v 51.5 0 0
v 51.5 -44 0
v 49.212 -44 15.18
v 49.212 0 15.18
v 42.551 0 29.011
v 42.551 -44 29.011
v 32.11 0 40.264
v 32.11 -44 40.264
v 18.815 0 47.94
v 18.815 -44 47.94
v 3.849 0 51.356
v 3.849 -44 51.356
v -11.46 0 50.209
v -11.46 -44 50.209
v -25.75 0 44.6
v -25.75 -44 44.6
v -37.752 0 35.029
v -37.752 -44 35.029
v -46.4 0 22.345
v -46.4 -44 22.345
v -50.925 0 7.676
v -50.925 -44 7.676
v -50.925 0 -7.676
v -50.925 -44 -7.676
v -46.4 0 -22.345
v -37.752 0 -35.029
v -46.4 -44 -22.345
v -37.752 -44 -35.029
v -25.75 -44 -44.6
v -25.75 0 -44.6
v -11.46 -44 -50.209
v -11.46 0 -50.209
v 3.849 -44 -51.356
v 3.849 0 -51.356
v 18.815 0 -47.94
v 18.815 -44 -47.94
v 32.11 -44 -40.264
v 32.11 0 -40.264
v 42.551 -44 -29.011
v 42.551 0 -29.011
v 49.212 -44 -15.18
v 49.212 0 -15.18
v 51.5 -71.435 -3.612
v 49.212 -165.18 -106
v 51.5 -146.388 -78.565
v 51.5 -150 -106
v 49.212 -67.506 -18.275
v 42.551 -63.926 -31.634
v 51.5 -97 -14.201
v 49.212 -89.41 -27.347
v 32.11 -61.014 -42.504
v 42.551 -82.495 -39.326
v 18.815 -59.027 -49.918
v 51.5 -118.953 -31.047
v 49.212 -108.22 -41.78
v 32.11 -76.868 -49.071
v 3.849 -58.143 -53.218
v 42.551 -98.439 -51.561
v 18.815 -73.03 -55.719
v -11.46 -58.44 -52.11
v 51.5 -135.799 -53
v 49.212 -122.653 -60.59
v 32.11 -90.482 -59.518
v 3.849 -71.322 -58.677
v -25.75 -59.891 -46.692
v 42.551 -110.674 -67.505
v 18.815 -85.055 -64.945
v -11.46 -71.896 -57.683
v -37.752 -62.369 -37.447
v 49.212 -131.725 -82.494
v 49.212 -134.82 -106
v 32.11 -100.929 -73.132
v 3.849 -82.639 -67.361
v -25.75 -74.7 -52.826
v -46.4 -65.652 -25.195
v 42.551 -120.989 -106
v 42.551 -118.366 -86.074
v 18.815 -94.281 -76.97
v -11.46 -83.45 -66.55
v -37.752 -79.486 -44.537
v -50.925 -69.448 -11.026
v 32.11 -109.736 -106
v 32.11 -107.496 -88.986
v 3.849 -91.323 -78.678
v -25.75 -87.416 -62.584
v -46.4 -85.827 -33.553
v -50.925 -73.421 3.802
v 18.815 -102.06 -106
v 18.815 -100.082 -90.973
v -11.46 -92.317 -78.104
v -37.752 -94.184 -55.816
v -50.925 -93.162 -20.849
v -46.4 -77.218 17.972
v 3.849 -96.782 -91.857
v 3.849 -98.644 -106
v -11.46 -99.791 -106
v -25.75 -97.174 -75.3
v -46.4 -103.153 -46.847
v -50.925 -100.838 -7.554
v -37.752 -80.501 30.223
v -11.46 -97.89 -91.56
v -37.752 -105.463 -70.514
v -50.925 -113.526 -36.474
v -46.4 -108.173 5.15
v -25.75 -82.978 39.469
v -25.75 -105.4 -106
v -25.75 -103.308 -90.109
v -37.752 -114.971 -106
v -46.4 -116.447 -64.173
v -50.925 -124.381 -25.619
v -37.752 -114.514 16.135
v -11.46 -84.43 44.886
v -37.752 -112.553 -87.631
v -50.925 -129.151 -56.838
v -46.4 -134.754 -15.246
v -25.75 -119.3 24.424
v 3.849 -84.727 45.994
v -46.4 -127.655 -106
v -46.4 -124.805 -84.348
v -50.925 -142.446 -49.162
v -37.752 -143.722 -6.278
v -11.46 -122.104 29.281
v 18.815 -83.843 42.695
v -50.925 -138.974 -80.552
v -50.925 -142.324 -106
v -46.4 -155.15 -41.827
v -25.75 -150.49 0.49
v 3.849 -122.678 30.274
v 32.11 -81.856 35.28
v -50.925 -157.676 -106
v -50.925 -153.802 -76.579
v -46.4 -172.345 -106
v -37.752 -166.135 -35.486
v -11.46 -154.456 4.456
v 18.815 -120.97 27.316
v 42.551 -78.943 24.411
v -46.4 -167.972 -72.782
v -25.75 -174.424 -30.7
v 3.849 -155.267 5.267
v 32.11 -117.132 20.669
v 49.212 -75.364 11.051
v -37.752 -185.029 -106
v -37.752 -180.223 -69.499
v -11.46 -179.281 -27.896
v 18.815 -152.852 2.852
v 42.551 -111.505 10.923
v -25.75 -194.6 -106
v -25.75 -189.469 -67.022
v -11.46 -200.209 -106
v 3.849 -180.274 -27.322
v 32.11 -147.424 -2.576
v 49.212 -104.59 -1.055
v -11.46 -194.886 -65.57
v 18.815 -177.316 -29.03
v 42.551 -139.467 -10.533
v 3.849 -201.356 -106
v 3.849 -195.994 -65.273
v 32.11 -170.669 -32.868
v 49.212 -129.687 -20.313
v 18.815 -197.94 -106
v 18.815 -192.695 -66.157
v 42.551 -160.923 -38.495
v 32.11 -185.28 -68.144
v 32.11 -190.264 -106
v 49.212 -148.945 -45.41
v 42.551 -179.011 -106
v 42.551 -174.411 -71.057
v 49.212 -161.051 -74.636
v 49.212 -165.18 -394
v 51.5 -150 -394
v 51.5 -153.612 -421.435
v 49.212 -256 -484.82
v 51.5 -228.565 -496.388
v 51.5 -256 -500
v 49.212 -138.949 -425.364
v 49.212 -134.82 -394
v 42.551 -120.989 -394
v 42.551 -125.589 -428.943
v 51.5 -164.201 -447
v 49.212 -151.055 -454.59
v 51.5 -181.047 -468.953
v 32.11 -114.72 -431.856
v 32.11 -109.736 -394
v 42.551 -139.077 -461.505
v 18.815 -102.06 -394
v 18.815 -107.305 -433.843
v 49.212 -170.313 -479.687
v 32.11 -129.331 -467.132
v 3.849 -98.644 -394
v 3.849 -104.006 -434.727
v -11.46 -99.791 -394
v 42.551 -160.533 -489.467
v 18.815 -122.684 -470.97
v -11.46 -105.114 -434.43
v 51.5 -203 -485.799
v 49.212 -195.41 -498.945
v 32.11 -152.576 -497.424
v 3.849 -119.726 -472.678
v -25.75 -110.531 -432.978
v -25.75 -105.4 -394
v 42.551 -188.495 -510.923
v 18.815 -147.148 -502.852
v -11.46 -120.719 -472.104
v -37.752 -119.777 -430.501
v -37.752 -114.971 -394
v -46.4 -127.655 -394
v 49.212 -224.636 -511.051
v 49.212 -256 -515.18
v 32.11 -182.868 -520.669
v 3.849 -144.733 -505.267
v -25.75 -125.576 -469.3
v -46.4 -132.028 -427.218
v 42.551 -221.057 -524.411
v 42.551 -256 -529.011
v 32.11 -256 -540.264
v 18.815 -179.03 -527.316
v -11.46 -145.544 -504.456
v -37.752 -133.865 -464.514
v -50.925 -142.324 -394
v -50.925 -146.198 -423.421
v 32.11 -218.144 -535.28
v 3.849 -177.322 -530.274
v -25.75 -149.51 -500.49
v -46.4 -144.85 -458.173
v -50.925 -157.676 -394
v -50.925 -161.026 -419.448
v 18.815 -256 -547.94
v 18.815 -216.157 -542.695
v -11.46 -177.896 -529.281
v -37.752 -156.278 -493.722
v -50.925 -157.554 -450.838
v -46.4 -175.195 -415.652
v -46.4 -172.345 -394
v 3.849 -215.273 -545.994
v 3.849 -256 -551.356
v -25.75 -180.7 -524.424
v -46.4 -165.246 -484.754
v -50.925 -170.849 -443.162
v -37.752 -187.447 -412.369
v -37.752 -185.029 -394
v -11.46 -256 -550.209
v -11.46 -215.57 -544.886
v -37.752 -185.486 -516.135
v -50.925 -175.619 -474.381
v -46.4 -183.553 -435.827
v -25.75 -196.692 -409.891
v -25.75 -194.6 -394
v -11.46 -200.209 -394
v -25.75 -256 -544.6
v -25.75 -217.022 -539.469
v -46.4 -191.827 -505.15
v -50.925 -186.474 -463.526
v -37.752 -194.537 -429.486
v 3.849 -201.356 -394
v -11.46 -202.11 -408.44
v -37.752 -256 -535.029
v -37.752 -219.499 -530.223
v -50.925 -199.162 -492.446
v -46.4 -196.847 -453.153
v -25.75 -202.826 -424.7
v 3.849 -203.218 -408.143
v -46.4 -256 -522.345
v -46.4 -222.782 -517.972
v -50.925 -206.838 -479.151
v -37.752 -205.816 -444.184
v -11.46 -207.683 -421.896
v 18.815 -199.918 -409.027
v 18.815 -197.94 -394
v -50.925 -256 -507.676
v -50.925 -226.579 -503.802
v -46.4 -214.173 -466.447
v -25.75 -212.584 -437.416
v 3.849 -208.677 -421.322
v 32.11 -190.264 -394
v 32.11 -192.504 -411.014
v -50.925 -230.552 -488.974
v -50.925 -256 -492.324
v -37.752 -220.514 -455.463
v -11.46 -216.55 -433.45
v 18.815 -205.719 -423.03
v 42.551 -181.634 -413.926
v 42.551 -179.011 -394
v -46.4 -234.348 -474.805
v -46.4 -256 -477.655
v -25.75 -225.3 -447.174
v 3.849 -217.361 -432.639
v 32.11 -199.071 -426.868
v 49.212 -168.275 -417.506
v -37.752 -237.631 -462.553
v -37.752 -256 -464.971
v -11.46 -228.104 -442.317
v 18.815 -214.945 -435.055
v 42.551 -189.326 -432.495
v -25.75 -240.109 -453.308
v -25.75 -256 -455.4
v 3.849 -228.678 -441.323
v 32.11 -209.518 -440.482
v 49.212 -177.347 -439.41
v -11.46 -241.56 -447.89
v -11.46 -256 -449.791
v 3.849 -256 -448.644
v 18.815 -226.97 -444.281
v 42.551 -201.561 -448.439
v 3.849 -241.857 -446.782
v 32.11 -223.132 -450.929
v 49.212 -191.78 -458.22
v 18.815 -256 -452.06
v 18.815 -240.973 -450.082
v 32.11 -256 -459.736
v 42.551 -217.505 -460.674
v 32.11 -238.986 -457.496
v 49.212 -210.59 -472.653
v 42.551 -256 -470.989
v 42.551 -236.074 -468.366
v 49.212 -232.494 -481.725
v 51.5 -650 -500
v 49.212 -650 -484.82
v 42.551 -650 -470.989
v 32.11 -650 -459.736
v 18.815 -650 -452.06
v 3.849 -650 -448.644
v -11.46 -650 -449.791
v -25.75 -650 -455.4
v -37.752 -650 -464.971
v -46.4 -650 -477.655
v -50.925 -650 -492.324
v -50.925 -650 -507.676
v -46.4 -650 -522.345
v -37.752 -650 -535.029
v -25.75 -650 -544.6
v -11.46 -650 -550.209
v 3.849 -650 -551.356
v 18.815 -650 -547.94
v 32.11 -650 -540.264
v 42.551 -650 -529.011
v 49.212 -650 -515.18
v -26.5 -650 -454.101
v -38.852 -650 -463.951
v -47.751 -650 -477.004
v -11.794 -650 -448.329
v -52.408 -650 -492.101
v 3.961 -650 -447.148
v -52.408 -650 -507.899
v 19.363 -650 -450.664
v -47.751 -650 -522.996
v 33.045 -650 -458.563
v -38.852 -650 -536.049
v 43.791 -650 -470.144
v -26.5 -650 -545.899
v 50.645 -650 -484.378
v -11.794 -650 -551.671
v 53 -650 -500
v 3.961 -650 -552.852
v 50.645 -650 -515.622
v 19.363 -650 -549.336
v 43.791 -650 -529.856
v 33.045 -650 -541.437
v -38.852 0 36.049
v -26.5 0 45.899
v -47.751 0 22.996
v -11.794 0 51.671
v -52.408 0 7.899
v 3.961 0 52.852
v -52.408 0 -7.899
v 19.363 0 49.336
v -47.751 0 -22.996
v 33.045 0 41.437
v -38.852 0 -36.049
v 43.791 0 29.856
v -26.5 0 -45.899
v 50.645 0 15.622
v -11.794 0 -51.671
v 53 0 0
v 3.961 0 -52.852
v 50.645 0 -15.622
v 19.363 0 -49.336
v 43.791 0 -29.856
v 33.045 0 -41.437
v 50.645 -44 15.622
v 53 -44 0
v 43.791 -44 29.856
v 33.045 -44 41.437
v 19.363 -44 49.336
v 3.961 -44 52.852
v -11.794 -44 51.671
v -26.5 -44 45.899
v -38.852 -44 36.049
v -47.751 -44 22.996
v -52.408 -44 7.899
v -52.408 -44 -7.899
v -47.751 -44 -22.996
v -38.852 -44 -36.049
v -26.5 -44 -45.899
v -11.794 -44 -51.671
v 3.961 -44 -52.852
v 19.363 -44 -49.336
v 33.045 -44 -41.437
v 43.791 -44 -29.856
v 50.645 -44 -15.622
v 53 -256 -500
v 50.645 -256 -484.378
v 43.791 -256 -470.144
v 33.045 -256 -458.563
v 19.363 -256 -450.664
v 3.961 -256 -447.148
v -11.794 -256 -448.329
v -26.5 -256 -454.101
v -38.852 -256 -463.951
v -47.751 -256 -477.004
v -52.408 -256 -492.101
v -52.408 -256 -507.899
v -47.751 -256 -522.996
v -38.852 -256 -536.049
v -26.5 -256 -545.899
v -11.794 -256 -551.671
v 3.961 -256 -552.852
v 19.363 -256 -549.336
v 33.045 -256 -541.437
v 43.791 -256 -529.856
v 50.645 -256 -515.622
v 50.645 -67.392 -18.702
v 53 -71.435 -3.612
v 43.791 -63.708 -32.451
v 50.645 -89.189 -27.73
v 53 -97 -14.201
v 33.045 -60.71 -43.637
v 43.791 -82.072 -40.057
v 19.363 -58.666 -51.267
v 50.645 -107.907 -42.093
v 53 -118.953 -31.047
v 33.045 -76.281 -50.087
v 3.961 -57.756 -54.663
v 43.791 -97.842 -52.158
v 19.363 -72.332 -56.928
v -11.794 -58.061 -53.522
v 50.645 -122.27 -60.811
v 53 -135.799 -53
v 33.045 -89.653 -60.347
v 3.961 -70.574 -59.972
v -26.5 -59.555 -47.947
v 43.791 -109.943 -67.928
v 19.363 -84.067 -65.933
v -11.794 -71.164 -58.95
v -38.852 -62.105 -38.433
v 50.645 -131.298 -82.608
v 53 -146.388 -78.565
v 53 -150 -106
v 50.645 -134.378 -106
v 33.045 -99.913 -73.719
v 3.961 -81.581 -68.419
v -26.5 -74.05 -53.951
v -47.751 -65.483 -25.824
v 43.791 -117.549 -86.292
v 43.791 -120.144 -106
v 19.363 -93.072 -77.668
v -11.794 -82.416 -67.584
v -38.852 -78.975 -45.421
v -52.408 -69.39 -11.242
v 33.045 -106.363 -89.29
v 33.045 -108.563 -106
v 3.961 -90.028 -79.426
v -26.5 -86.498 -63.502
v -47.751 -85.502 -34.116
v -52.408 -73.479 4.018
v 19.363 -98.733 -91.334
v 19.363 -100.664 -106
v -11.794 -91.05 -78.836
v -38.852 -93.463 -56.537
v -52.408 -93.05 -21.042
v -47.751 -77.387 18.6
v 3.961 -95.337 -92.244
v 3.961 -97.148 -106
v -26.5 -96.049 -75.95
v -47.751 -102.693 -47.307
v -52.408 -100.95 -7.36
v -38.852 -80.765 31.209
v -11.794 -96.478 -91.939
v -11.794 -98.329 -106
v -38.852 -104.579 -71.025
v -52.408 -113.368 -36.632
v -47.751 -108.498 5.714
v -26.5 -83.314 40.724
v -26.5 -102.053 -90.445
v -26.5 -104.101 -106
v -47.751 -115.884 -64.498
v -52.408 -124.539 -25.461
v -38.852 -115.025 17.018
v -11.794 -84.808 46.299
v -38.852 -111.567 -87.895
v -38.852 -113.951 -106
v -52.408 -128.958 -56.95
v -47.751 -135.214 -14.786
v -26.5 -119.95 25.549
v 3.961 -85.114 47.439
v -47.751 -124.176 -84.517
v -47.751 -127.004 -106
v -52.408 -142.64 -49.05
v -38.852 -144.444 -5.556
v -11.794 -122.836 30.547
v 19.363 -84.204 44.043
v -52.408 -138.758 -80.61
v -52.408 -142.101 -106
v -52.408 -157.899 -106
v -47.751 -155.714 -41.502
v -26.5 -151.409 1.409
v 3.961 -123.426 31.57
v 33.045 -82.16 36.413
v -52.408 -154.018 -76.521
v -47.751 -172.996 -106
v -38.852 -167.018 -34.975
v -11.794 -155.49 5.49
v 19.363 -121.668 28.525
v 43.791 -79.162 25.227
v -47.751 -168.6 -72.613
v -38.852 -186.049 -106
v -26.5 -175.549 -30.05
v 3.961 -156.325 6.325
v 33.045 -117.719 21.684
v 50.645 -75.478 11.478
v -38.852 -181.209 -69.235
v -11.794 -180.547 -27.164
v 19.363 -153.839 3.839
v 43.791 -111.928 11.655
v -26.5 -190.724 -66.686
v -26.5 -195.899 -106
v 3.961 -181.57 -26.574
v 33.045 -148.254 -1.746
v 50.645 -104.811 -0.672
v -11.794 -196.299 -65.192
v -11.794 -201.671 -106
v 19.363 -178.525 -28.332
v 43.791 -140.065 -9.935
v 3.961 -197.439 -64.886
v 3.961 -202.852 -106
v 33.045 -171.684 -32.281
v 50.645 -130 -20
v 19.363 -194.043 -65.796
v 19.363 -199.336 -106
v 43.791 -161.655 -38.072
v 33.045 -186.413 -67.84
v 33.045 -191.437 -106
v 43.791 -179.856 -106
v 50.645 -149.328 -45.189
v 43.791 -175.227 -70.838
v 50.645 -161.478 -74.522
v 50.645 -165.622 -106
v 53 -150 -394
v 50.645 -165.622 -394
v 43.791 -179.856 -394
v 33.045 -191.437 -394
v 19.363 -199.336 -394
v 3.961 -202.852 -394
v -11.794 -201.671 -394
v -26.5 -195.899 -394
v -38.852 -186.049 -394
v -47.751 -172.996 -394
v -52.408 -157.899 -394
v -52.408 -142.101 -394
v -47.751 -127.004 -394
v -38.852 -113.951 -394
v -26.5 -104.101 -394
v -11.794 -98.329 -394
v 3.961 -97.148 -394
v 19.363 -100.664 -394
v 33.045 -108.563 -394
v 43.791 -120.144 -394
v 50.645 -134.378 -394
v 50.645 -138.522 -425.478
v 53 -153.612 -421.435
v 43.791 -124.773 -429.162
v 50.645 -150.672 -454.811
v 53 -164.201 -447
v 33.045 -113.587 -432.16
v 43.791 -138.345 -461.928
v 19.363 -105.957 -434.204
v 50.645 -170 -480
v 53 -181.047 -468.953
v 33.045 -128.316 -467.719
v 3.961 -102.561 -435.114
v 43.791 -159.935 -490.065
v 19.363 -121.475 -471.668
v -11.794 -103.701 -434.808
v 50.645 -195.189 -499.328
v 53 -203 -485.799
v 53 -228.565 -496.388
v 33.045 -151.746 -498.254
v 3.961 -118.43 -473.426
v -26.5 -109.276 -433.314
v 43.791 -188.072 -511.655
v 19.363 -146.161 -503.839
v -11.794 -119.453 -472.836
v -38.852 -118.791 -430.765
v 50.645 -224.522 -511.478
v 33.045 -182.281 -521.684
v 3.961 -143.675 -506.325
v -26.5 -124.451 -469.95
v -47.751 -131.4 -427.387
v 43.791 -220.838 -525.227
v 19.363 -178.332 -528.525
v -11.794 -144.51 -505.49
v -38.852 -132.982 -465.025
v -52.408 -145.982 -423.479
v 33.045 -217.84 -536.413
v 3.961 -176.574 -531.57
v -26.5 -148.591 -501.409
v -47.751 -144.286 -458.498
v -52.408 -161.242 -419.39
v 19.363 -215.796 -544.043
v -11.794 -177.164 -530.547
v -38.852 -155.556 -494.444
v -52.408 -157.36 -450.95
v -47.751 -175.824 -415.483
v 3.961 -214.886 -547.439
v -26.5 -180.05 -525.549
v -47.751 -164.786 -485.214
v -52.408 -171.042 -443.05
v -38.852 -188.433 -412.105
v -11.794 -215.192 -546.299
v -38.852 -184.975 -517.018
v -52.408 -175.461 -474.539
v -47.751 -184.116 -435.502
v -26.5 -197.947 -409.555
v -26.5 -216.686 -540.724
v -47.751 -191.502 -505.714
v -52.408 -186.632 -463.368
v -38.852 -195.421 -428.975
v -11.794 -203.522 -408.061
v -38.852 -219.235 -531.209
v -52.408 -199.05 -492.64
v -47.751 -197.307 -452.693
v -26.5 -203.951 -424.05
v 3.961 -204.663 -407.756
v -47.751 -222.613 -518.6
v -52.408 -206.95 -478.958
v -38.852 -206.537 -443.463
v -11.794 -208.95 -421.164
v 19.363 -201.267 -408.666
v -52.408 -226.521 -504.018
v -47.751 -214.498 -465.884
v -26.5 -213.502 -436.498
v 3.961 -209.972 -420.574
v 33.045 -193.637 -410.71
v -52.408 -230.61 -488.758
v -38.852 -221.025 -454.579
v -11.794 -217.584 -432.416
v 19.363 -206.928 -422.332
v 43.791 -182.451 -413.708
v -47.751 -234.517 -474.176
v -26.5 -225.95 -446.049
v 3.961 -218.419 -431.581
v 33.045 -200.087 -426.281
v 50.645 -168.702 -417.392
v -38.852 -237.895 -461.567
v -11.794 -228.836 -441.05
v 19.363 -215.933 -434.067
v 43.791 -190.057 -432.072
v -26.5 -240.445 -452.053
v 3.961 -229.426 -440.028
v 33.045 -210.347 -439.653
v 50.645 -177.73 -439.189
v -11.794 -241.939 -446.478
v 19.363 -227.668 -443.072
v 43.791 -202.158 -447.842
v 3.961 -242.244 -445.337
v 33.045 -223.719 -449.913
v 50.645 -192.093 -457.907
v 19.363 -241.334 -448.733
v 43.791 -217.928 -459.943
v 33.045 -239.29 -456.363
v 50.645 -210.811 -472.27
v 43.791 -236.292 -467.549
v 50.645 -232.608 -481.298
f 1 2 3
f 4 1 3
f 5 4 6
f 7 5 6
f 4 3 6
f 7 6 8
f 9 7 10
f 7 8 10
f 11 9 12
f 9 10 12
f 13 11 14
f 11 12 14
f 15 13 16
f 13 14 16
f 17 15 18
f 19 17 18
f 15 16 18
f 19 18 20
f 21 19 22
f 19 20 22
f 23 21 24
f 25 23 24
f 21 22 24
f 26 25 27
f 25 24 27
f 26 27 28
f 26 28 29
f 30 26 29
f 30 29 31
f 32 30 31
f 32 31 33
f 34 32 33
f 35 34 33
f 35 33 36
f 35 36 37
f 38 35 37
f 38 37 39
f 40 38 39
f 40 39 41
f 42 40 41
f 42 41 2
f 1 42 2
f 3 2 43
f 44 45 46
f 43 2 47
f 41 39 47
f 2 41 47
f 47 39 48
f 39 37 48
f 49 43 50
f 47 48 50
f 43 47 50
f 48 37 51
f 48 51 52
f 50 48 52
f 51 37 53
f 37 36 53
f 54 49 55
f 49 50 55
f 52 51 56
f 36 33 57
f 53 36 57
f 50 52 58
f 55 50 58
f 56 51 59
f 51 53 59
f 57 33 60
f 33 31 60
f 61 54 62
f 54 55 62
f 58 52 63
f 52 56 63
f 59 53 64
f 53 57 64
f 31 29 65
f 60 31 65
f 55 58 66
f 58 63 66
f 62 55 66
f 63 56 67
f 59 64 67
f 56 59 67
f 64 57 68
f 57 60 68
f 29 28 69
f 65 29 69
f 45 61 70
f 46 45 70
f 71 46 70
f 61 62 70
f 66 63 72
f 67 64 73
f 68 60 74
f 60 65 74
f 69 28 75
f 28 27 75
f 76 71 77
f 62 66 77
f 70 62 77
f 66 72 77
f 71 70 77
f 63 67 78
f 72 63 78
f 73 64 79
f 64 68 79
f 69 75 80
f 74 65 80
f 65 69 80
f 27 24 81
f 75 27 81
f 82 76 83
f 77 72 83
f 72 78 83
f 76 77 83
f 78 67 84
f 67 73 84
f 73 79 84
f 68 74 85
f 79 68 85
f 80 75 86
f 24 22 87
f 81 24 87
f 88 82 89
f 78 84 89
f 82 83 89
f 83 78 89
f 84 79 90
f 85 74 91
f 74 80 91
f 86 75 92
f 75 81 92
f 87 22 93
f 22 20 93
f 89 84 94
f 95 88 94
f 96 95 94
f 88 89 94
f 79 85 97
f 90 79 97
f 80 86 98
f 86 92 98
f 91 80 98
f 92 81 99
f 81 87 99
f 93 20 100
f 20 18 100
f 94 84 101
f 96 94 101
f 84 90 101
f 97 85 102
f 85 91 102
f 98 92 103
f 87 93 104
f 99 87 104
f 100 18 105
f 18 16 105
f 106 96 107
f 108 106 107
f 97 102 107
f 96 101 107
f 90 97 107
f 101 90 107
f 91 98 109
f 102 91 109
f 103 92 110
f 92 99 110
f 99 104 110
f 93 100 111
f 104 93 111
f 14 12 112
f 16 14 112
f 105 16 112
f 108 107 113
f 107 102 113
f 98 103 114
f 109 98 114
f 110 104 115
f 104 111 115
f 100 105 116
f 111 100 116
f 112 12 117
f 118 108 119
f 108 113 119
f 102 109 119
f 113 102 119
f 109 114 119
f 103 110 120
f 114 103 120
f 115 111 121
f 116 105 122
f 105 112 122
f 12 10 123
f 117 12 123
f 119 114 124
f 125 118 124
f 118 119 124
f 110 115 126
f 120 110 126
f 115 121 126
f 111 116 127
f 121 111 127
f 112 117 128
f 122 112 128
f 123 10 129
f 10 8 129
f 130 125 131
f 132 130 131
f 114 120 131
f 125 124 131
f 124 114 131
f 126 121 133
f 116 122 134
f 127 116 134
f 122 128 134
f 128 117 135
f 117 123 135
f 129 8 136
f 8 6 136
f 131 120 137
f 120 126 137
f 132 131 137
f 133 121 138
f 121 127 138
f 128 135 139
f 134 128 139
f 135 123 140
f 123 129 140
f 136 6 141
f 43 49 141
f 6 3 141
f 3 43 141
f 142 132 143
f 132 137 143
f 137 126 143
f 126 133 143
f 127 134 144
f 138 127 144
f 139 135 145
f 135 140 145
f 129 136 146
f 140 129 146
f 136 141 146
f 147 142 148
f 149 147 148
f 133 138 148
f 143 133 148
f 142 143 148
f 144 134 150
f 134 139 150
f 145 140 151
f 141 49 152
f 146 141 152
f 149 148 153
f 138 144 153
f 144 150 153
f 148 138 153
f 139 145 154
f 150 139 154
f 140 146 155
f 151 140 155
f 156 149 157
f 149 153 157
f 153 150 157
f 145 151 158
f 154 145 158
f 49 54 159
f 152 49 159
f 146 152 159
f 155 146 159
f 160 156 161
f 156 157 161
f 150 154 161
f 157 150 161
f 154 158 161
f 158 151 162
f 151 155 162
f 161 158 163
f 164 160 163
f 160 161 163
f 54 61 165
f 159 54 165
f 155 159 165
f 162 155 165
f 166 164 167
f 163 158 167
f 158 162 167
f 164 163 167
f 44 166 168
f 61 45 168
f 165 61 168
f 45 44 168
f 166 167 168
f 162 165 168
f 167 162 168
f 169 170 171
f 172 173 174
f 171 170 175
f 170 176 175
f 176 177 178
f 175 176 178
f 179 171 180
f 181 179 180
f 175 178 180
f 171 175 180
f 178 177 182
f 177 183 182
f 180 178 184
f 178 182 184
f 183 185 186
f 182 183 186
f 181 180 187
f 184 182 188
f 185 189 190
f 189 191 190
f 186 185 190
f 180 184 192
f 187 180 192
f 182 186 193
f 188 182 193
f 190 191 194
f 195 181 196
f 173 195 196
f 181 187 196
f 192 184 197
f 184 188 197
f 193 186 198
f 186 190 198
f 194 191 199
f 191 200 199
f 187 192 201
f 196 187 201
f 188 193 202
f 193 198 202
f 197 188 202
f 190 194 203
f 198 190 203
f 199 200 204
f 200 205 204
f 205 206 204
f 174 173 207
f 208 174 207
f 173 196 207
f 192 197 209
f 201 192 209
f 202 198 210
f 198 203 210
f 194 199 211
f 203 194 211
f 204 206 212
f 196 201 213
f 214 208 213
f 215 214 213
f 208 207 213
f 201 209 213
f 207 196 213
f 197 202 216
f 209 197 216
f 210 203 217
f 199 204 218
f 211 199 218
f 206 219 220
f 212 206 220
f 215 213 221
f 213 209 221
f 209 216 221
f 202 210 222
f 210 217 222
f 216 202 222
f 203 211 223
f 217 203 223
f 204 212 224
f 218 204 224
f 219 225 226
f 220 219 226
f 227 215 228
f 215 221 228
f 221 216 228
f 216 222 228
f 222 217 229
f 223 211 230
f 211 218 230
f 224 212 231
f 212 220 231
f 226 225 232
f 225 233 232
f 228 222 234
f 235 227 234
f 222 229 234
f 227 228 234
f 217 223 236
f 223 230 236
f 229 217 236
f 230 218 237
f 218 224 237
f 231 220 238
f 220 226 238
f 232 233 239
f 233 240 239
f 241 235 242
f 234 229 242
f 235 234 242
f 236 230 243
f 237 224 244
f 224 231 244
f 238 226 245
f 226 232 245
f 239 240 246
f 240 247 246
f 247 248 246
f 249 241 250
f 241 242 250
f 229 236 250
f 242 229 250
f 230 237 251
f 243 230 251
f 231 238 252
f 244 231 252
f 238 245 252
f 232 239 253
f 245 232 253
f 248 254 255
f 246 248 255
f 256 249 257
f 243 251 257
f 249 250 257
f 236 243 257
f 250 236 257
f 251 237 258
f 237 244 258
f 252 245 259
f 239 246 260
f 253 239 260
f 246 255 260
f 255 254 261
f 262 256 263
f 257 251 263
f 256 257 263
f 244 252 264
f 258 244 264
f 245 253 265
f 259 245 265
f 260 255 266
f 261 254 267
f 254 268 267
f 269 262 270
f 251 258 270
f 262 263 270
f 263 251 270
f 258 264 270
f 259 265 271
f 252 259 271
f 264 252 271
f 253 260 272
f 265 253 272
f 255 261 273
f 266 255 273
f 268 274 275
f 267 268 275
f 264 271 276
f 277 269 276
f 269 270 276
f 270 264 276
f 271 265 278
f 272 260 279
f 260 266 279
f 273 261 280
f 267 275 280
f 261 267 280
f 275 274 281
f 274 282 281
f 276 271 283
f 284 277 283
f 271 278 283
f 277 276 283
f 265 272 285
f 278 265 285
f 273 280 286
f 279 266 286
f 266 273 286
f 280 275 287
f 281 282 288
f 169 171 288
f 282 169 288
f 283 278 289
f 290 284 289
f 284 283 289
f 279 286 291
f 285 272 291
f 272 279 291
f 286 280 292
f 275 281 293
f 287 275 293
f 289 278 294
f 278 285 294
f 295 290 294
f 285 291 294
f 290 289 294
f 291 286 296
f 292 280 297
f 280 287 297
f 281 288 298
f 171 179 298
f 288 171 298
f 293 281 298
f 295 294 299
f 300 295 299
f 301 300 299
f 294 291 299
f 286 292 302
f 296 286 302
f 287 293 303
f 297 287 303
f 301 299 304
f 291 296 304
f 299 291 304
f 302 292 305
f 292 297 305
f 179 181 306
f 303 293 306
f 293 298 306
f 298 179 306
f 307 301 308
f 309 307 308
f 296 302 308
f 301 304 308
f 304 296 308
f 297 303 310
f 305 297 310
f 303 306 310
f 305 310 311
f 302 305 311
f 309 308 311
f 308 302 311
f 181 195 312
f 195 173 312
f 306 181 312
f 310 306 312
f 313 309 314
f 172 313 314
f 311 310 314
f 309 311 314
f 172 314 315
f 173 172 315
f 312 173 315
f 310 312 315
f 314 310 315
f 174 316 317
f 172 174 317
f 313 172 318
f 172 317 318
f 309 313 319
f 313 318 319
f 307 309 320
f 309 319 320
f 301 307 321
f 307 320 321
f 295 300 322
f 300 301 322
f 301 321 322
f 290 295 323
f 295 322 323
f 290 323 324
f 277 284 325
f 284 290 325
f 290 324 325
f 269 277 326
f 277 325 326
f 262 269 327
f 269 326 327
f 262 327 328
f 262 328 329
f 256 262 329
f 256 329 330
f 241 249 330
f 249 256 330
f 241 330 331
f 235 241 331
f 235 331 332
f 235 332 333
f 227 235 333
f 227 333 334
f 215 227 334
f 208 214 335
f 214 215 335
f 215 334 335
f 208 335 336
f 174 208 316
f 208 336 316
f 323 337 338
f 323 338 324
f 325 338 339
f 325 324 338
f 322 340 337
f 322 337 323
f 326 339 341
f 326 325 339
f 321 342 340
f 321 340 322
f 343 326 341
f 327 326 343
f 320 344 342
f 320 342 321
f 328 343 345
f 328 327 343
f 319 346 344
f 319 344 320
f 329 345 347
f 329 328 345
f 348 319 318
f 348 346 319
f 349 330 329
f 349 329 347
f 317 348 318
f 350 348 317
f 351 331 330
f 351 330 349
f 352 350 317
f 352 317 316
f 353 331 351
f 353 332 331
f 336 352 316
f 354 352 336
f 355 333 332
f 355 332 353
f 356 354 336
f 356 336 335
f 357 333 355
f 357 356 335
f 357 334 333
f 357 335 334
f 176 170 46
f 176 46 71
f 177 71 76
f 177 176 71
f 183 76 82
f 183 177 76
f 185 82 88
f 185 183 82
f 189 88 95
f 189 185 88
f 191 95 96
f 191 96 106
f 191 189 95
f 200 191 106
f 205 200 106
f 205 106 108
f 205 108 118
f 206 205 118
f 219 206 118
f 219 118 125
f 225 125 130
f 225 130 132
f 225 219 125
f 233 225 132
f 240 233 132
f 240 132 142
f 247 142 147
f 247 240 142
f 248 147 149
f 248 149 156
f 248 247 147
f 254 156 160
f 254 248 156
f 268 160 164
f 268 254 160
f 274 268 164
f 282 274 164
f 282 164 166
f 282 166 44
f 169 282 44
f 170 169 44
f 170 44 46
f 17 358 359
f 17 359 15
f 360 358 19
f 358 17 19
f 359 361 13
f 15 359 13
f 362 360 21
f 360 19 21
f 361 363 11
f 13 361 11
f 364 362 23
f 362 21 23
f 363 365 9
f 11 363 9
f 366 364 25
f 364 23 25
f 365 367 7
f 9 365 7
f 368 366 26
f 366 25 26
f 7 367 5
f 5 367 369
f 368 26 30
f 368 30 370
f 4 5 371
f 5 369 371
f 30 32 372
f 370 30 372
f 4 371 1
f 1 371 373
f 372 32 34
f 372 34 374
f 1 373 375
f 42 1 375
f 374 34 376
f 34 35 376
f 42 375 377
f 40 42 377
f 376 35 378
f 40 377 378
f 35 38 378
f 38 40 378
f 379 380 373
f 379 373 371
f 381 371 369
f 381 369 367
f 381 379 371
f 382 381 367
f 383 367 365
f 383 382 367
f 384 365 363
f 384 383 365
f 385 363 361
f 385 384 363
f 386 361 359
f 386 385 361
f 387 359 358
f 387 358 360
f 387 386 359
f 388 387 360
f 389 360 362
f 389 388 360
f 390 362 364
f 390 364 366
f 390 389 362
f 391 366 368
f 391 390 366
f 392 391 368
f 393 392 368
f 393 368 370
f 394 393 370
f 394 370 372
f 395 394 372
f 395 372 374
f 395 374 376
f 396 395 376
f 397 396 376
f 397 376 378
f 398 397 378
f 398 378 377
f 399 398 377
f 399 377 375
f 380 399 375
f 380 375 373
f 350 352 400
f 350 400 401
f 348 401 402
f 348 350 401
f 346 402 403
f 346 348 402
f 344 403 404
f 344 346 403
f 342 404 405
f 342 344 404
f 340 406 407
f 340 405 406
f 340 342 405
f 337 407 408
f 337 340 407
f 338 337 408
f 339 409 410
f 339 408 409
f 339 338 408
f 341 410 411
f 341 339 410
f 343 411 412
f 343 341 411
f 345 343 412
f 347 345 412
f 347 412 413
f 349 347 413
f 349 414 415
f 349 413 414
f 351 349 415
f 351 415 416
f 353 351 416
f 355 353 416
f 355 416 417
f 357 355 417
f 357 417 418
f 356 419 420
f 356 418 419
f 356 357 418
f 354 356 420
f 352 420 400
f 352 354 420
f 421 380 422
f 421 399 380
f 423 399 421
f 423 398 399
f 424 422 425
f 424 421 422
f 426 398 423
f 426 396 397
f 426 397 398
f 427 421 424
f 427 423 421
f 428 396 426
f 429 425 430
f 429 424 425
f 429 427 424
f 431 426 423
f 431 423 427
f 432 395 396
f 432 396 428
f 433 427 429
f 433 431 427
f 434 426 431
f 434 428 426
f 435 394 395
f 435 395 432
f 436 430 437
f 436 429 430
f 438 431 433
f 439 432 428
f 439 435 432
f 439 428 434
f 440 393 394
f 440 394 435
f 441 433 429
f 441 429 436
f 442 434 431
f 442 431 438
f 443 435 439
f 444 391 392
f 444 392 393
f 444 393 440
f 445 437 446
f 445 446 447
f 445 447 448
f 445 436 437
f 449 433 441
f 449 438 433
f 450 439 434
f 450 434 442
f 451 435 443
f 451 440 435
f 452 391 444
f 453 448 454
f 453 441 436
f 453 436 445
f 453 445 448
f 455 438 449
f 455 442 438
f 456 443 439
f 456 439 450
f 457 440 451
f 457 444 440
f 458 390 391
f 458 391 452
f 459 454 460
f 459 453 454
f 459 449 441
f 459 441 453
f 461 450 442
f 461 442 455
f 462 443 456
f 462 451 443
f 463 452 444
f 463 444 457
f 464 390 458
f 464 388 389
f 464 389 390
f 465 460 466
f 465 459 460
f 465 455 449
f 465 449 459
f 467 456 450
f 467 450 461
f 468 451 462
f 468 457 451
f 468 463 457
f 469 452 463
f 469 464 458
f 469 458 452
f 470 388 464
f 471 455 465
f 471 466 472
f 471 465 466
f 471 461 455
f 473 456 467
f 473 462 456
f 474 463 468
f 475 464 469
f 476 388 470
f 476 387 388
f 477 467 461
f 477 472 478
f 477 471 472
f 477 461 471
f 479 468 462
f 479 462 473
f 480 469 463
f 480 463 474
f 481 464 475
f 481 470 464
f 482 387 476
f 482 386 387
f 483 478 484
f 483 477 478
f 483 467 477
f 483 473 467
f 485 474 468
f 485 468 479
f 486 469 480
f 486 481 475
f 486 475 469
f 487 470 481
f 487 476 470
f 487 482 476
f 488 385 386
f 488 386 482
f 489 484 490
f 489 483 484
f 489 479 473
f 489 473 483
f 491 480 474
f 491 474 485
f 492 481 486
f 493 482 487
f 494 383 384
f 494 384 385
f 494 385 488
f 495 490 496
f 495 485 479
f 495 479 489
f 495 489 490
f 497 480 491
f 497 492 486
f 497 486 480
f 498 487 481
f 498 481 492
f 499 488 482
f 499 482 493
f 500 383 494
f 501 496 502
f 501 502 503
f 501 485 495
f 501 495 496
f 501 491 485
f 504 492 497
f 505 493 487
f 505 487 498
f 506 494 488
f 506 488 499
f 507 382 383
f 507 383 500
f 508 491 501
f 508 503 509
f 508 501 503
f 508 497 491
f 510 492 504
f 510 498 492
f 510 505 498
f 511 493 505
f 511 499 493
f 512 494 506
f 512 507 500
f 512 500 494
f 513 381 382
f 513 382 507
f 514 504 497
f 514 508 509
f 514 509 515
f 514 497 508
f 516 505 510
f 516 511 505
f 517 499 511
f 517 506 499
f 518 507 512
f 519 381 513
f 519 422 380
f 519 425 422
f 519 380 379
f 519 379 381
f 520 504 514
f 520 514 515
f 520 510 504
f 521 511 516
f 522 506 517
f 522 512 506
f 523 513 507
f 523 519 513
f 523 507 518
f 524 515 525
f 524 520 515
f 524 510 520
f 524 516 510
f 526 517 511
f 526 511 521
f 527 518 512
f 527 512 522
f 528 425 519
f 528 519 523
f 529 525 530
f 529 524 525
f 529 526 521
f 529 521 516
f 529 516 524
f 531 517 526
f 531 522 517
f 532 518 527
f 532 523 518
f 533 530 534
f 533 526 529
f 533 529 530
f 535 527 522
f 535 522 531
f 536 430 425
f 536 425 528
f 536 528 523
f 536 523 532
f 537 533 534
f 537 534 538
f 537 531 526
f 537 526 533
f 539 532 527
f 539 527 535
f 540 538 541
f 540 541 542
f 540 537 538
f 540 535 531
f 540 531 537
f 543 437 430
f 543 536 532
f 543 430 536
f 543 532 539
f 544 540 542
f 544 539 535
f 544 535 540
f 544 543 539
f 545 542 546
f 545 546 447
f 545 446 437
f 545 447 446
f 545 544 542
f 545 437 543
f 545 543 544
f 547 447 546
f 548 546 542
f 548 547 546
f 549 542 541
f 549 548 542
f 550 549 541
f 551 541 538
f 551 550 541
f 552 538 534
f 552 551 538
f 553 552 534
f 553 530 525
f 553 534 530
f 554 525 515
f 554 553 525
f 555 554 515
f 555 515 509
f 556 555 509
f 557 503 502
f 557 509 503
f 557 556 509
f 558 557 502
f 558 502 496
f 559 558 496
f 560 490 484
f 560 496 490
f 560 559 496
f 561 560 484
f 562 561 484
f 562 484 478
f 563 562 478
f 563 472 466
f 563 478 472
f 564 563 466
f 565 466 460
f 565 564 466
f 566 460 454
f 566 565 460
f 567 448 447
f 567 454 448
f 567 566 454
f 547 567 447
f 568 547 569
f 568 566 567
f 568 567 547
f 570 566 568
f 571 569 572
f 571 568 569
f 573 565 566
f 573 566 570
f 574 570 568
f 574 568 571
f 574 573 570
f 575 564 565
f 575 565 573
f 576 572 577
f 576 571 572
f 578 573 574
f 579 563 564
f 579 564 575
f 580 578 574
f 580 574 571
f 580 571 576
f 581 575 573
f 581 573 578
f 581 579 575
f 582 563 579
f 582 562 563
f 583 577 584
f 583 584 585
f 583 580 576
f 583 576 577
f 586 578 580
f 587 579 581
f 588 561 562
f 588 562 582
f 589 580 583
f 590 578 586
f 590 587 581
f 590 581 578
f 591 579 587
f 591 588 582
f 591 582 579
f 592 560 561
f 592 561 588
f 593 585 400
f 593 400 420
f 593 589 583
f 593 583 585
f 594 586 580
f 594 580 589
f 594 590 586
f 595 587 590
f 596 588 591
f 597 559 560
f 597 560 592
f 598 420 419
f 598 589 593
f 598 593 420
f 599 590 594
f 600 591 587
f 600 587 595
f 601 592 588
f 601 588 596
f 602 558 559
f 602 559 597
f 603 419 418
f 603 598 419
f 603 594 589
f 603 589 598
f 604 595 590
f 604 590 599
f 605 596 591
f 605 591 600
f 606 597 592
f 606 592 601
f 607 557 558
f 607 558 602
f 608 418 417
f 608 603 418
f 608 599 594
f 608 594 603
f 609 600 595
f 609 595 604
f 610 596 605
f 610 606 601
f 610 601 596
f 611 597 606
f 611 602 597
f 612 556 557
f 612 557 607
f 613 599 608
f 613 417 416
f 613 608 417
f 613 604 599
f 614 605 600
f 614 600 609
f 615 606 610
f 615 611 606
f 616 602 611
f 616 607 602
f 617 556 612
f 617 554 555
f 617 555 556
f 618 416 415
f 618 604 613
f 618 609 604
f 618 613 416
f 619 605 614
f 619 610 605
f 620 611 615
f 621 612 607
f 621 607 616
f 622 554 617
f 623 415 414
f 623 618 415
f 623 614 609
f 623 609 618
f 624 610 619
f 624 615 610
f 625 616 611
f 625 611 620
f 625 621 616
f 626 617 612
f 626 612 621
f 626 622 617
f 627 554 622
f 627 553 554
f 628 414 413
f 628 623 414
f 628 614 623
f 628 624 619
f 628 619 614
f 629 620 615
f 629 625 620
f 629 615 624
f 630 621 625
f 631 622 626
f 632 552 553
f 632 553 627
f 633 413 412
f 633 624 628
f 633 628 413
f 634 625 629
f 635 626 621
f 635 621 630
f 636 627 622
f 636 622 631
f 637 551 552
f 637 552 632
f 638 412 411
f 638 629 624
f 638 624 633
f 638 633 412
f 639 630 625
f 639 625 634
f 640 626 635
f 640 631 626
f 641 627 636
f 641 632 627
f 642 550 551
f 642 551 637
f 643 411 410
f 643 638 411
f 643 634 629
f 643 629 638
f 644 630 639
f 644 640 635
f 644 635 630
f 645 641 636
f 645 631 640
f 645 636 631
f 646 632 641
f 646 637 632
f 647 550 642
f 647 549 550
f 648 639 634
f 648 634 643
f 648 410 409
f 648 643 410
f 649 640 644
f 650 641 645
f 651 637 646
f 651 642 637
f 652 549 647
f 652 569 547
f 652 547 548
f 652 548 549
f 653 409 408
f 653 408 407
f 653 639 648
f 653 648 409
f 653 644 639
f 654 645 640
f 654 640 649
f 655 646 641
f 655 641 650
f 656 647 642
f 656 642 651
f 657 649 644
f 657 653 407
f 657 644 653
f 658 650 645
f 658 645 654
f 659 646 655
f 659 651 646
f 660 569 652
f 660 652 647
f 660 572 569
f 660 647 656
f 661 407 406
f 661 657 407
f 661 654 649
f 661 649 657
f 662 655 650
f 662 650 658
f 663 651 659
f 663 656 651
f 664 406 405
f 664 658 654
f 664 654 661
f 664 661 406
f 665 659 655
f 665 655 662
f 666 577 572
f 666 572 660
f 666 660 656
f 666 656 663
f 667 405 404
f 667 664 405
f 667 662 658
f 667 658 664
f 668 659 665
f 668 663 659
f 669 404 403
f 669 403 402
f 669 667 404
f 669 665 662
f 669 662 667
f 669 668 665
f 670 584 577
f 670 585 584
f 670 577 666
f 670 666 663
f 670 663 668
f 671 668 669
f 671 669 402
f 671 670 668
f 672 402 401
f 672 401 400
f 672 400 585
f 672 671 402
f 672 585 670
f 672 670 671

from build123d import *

# Parameters (mm, degrees)
F0_R   = 53
F0_R_2 = 51.5


with BuildPart() as f2:
    # F2: sweep along a path in F1
    with BuildLine(Plane.YZ) as f2_path:
        Line((0, 0), (-44, 0))
        ThreePointArc((-44, 0), (-118.953319, -31.046681), (-150, -106))
        Line((-150, -106), (-150, -394))
        ThreePointArc((-150, -394), (-181.046681, -468.953319), (-256, -500))
        Line((-256, -500), (-650, -500))
    # F0 (on Front) → F2 (sweep)
    with BuildSketch(Plane.XZ):
        Circle(F0_R)
        Circle(F0_R_2, mode=Mode.SUBTRACT)
    sweep(path=f2_path.line)


solid = f2.part
